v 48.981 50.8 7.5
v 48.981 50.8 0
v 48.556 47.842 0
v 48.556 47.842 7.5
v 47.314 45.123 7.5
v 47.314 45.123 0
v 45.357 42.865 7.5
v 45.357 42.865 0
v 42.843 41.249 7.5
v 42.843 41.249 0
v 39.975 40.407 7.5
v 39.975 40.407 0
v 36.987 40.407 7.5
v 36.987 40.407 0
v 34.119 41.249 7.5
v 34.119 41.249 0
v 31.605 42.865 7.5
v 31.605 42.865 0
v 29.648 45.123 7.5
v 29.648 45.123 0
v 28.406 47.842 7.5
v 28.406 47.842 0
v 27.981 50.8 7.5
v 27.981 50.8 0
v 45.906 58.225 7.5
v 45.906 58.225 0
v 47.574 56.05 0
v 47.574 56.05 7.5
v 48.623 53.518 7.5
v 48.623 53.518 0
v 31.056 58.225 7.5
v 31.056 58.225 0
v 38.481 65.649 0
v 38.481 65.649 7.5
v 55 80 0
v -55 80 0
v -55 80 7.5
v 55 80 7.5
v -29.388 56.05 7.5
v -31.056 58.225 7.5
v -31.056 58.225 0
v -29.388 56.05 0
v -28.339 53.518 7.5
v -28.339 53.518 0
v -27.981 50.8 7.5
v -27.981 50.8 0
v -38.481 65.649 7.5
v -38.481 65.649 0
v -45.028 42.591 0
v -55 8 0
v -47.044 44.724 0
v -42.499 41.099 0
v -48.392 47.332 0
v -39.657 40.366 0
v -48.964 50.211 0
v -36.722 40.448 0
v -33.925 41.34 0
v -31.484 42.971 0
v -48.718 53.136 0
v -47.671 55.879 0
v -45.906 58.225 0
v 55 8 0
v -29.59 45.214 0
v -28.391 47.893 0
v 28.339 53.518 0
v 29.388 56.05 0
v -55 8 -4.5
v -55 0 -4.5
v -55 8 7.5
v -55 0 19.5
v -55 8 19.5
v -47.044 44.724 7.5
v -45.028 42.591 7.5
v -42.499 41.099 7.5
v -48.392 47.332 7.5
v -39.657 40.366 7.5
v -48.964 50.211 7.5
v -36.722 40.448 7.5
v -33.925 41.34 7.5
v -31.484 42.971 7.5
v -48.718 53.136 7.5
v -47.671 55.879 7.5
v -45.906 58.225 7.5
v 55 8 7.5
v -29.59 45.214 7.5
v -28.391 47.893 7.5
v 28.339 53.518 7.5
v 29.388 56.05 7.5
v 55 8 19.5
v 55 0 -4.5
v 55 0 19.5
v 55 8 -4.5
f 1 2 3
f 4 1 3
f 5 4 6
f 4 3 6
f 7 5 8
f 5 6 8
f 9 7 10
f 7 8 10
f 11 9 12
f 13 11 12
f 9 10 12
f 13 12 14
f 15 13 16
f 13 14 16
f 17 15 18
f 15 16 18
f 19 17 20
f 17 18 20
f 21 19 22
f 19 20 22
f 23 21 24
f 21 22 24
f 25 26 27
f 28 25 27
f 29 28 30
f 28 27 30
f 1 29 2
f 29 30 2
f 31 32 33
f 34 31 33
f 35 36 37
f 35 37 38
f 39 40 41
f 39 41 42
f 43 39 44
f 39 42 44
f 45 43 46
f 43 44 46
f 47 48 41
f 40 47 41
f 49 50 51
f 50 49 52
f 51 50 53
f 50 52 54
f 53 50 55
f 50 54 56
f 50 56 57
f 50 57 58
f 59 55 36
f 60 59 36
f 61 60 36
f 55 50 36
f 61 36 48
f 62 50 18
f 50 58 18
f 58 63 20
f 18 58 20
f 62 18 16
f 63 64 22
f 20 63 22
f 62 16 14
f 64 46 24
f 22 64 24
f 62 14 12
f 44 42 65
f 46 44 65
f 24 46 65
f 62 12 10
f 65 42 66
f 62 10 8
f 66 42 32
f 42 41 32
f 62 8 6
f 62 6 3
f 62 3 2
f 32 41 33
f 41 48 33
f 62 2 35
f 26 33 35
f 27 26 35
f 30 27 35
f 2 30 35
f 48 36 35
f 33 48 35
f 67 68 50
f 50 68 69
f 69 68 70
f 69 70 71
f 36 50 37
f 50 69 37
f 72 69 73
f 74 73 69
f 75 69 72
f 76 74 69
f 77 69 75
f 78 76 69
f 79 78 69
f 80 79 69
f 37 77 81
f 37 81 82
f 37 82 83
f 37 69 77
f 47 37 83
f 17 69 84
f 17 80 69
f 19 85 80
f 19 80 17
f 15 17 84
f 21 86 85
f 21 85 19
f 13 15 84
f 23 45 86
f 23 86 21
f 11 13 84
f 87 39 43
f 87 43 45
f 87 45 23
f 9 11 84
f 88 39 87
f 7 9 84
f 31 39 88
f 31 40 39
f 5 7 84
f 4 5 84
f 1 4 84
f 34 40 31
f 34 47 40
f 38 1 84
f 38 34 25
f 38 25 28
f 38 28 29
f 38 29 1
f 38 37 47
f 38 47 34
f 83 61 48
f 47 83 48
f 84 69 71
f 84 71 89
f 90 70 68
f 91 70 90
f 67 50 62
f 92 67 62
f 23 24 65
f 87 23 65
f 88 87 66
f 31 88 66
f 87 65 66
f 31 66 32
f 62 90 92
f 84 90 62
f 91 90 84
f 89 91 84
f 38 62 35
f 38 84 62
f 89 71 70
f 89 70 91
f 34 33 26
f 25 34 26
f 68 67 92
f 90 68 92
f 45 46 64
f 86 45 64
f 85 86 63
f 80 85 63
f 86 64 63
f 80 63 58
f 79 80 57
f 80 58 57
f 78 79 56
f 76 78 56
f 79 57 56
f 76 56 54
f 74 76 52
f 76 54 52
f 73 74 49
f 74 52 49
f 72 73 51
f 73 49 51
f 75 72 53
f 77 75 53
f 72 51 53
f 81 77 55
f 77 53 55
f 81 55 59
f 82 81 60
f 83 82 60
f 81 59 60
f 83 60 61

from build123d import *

# Parameters (mm, degrees)
SKETCH1_W                = 110
SKETCH1_H                = 80
BOSS_EXTRUDE1_DEPTH      = 7.5
SKETCH3_W                = 110
SKETCH3_H                = 8
BOSS_EXTRUDE2_DEPTH      = 12
BOSS_EXTRUDE2_DEPTH_BACK = 12


with BuildPart() as part:
    # Sketch1 → Boss-Extrude1 (new body)
    with BuildSketch(Plane.XY):
        with Locations((0, 40)):
            Rectangle(SKETCH1_W, SKETCH1_H)
        with BuildLine():
            ThreePointArc((-27.981, 50.8), (-42.49917604, 41.099264909), (-45.905621202, 58.224621202))
            Line((-45.905621202, 58.224621202), (-38.481, 65.649242405))
            Line((-38.481, 65.649242405), (-31.056378798, 58.224621202))
            ThreePointArc((-31.056378798, 58.224621202), (-28.780264909, 54.81817604), (-27.981, 50.8))
        make_face(mode=Mode.SUBTRACT)
        with BuildLine():
            ThreePointArc((27.981, 50.8), (28.780264909, 54.81817604), (31.056378798, 58.224621202))
            Line((31.056378798, 58.224621202), (38.481, 65.649242405))
            Line((38.481, 65.649242405), (45.905621202, 58.224621202))
            ThreePointArc((45.905621202, 58.224621202), (48.181735091, 54.81817604), (48.981, 50.8))
            ThreePointArc((48.981, 50.8), (38.481, 40.3), (27.981, 50.8))
        make_face(mode=Mode.SUBTRACT)
    extrude(amount=BOSS_EXTRUDE1_DEPTH)

    # Sketch3 → Boss-Extrude2 (add, two sides)
    with BuildSketch(Plane.XY.offset(7.5)) as boss_extrude2_sk:
        with Locations((0, 4)):
            Rectangle(SKETCH3_W, SKETCH3_H)
    extrude(amount=BOSS_EXTRUDE2_DEPTH)
    extrude(boss_extrude2_sk.sketch, amount=-BOSS_EXTRUDE2_DEPTH_BACK)


solid = part.part
